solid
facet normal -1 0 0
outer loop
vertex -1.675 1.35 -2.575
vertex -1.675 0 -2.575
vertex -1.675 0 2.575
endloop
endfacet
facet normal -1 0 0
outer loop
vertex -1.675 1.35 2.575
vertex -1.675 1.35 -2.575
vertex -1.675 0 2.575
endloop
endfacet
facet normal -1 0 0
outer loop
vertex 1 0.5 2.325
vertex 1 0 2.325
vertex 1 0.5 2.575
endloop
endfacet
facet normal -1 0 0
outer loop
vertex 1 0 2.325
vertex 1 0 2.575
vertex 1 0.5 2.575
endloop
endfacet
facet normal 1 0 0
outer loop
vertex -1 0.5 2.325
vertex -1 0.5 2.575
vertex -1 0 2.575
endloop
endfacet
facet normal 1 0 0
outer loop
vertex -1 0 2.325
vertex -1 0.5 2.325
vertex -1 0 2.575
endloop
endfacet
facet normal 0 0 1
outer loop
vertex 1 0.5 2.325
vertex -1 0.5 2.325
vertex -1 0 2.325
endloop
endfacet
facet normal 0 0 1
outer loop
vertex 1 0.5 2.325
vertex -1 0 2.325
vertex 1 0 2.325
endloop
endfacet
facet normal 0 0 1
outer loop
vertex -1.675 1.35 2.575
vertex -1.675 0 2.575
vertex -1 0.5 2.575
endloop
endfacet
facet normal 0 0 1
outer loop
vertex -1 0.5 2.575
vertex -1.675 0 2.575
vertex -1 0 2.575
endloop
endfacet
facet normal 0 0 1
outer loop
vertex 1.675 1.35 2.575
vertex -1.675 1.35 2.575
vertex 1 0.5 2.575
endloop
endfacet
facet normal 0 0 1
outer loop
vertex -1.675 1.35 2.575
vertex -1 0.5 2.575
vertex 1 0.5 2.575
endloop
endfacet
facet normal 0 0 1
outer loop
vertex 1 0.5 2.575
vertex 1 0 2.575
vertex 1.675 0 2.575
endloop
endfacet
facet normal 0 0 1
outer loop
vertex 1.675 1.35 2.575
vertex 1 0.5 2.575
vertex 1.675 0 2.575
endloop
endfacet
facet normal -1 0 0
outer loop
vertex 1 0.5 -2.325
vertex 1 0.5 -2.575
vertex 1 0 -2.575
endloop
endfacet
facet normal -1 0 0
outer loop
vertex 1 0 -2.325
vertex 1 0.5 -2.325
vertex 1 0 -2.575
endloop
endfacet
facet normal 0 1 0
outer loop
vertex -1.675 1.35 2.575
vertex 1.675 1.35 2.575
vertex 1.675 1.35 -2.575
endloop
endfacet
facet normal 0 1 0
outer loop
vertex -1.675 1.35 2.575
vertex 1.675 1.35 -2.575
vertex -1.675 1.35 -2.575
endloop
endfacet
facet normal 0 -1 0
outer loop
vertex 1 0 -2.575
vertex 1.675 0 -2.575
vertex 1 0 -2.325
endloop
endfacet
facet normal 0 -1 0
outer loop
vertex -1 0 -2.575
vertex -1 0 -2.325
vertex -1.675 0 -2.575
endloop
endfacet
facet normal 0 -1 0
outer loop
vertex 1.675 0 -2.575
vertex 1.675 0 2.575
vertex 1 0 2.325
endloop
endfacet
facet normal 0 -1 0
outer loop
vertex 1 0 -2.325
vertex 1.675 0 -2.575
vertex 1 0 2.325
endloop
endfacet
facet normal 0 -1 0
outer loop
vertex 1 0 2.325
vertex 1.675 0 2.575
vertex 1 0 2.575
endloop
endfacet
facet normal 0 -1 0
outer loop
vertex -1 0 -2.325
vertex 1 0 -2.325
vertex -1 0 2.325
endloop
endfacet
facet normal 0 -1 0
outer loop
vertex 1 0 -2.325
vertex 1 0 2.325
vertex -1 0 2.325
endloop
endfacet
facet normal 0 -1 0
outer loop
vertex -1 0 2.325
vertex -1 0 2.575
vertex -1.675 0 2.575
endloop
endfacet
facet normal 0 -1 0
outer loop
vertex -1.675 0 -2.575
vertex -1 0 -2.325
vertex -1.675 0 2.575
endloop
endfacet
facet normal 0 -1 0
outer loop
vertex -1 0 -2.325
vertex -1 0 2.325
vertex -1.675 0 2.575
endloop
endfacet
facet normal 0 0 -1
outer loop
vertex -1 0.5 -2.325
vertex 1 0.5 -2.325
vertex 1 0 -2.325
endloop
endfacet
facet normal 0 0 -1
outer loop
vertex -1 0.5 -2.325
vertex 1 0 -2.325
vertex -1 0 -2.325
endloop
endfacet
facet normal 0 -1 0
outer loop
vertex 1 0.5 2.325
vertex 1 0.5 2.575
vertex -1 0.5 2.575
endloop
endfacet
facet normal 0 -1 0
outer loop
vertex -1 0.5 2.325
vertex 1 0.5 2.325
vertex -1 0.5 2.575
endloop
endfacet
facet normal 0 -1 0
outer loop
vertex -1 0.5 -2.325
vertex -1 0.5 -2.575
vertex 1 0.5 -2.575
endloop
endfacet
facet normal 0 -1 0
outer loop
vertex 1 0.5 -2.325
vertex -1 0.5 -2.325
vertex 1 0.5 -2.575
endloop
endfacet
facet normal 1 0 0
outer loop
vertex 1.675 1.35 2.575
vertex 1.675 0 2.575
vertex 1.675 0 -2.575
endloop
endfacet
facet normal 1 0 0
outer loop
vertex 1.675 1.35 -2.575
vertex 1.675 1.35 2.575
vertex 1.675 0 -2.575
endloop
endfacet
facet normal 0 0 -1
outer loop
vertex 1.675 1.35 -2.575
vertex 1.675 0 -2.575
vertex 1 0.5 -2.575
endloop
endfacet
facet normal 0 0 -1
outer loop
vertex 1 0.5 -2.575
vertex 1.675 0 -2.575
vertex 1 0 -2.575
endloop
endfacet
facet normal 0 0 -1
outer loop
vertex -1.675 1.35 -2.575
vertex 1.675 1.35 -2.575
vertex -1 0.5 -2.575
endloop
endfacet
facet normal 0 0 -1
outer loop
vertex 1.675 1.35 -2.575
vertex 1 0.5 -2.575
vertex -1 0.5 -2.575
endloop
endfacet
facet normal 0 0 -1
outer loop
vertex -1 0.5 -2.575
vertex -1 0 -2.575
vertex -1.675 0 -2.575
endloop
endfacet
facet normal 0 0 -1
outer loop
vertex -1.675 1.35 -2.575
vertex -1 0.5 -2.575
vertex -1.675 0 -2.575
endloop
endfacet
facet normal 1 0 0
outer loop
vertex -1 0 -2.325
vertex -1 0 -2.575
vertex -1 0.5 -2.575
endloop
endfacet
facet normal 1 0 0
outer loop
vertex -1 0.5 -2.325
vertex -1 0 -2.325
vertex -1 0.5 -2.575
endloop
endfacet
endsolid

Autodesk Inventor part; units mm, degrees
ref_plane "YZ Plane" through (0, 0, 0) normal (1, 0, 0) x (0, 1, 0)
ref_plane "XZ Plane" through (0, 0, 0) normal (0, 1, 0) x (-1, 0, 0)
ref_plane "XY Plane" through (0, 0, 0) normal (0, 0, 1) x (1, 0, 0)
sketch "Sketch1" plane through (0, 0, 0) normal (0, 1, 0) x (-1, 0, 0)
  line L0 (1.675, 2.575) -> (-1.675, 2.575)
  line L1 (-1.675, 2.575) -> (-1.675, -2.575)
  line L2 (-1.675, -2.575) -> (1.675, -2.575)
  line L3 (1.675, -2.575) -> (1.675, 2.575)
  point P0 (0, 0)
  dimension "d0" = 5.15
  dimension "d1" = 2.575
  dimension "d2" = 3.35
  dimension "d3" = 1.675
extrude "Extrusion1" add sketch "Sketch1" along normal blind 1.35
sketch "Sketch2" plane through (-1.675, 0, 2.575) normal (0, 0, 1) x (1, 0, 0)
  line L0 (0.675, 0) -> (2.675, 0)
  line L1 (2.675, 0) -> (2.675, 0.5)
  line L2 (2.675, 0.5) -> (0.675, 0.5)
  line L3 (0.675, 0.5) -> (0.675, 0)
  line L4 (0, 0) -> (3.35, 0) projected
  point P0 (1.675, 0)
  dimension "d6" = 2
  dimension "d7" = 1
  dimension "d8" = 0
  dimension "d9" = 0.5
extrude "Extrusion2" cut sketch "Sketch2" against normal blind 0.25
mirror "Mirror1" about plane through (0, 0, 0) normal (0, 0, 1) of "Extrusion2"
properties part number "XTAL_5032"
